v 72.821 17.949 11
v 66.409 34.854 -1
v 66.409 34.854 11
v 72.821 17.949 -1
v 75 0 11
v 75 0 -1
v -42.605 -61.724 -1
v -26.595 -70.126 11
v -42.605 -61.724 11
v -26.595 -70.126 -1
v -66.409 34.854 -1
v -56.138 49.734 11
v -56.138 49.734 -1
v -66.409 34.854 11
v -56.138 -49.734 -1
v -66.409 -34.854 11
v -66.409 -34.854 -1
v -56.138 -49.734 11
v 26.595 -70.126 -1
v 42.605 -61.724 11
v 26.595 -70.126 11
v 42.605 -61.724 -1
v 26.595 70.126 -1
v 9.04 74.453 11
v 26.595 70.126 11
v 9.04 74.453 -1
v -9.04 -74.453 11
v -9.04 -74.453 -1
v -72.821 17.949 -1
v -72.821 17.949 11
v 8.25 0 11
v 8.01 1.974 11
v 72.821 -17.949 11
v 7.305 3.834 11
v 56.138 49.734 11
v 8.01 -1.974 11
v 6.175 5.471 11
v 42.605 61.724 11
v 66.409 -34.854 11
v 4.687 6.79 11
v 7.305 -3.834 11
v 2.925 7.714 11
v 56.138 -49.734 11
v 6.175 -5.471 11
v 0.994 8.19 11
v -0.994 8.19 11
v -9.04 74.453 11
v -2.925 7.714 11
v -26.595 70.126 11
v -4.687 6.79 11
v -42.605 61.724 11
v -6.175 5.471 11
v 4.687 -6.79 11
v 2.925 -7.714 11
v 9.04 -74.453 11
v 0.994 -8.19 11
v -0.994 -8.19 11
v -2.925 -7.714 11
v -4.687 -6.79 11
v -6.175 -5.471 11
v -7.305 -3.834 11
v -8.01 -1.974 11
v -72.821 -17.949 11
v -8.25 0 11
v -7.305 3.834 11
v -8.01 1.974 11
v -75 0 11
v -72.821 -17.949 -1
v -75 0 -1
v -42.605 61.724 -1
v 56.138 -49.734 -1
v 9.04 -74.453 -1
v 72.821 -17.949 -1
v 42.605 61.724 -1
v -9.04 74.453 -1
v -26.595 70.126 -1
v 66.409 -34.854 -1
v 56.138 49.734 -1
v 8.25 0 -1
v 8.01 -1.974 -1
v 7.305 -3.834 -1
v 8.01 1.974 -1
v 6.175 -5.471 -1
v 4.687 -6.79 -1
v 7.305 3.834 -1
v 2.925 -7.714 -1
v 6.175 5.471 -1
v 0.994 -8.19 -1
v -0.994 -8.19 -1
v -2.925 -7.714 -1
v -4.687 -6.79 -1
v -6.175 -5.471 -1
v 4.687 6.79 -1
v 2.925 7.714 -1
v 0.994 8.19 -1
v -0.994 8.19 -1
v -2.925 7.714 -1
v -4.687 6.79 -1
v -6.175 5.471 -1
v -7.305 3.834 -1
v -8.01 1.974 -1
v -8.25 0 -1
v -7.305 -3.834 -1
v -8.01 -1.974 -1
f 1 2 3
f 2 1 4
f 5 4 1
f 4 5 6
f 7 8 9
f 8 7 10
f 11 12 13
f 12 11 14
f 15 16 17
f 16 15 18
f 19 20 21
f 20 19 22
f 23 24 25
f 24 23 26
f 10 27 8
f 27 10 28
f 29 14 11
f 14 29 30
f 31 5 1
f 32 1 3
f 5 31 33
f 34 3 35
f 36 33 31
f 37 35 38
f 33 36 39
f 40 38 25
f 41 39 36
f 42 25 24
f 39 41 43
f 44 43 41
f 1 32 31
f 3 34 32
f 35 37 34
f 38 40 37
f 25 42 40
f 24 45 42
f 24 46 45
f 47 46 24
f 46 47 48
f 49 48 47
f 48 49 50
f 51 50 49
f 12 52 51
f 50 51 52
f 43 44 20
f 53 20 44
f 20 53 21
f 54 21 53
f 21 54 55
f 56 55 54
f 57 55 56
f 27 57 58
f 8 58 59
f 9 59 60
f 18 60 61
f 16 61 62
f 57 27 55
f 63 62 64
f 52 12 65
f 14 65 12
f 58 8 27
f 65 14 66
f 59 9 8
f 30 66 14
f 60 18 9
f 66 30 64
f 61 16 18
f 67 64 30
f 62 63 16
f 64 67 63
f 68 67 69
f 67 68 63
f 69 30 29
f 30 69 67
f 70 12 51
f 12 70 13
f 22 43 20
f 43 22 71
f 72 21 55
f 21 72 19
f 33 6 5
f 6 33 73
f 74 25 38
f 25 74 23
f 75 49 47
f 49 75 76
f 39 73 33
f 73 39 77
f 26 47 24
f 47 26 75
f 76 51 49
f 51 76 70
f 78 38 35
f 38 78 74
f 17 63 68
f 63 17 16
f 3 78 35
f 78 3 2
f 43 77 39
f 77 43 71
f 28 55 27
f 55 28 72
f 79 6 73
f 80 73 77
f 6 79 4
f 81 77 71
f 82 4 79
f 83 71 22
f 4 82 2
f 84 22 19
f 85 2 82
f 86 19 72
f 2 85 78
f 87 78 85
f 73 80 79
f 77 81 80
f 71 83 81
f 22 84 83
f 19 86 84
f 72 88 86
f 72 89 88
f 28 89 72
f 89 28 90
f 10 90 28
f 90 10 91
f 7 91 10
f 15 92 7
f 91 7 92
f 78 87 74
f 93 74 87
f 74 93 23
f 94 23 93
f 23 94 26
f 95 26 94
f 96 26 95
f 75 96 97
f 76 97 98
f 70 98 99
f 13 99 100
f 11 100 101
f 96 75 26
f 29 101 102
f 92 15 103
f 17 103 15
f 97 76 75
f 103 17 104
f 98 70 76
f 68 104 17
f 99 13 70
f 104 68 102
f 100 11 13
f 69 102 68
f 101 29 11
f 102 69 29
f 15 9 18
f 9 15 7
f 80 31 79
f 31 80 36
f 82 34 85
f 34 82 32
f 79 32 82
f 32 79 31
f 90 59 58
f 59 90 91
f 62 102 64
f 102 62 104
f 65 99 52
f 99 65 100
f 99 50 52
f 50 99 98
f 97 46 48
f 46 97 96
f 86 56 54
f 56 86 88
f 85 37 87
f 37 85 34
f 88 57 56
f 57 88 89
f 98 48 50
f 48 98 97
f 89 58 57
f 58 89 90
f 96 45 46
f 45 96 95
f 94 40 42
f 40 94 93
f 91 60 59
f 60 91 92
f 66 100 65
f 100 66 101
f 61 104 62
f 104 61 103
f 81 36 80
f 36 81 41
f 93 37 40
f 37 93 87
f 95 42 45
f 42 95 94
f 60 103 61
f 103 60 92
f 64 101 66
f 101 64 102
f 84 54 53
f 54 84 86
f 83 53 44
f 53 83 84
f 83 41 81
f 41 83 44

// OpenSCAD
diametro=150; // diametro cilindro
spessore=12; // spessore di mezzo cilindro

foro_dia=16.5; // diametro foro centrale
foro_H=spessore*2+4; // altezza

ghiera_Ypos=91; // posizione cilindro per foro ghiera
ghiera_dia=28; // diametro cilindro foro della ghiera

alfabeto="ABCDEFGHIJKLMNOPQRSTUVWXYZ"; // alfabeto
cifra1="BDFHJLCPRTXVZNYEIWGAKMUSQO"; // alfabeto cifrato

cifra2="JDKSIRUXBLHWTAMCQGZNPYFVOE";
cifra3="EKMFLGDQVZNTOWYHXUSPAIBRCJ";
cifra4="GAJDSIRWUXBLKHTMQNPYFVOEZC";
cifra5="KMGDVZNOWYHFXUSQPTELAIBRCJ";

//MAIN

difference() {
union() {
    translate([0, 0, 5])
    cifrario(alfabeto);
    //ghiera();
} //union
cylinder(r=foro_dia/2, h=foro_H, center=true);
} //difference

// cilindro con lettere
module cifrario(testo_cifrario) {
cylinder(r=diametro/2, h=spessore, $fn=26, center=true);

} // modulo

// ghiera centrale
module ghiera() {
difference() {
    cylinder(r=diametro/2+6, h=2, center=true);
    for (i=[0:25]) {
        rotate([0, 0, 360/26*i]) {
        translate([0, ghiera_Ypos, 0])
         {
          cylinder(r=ghiera_dia/2, h=20, center=true);
        }
        } // rotate
    } //for
    } //difference
} //modulo
